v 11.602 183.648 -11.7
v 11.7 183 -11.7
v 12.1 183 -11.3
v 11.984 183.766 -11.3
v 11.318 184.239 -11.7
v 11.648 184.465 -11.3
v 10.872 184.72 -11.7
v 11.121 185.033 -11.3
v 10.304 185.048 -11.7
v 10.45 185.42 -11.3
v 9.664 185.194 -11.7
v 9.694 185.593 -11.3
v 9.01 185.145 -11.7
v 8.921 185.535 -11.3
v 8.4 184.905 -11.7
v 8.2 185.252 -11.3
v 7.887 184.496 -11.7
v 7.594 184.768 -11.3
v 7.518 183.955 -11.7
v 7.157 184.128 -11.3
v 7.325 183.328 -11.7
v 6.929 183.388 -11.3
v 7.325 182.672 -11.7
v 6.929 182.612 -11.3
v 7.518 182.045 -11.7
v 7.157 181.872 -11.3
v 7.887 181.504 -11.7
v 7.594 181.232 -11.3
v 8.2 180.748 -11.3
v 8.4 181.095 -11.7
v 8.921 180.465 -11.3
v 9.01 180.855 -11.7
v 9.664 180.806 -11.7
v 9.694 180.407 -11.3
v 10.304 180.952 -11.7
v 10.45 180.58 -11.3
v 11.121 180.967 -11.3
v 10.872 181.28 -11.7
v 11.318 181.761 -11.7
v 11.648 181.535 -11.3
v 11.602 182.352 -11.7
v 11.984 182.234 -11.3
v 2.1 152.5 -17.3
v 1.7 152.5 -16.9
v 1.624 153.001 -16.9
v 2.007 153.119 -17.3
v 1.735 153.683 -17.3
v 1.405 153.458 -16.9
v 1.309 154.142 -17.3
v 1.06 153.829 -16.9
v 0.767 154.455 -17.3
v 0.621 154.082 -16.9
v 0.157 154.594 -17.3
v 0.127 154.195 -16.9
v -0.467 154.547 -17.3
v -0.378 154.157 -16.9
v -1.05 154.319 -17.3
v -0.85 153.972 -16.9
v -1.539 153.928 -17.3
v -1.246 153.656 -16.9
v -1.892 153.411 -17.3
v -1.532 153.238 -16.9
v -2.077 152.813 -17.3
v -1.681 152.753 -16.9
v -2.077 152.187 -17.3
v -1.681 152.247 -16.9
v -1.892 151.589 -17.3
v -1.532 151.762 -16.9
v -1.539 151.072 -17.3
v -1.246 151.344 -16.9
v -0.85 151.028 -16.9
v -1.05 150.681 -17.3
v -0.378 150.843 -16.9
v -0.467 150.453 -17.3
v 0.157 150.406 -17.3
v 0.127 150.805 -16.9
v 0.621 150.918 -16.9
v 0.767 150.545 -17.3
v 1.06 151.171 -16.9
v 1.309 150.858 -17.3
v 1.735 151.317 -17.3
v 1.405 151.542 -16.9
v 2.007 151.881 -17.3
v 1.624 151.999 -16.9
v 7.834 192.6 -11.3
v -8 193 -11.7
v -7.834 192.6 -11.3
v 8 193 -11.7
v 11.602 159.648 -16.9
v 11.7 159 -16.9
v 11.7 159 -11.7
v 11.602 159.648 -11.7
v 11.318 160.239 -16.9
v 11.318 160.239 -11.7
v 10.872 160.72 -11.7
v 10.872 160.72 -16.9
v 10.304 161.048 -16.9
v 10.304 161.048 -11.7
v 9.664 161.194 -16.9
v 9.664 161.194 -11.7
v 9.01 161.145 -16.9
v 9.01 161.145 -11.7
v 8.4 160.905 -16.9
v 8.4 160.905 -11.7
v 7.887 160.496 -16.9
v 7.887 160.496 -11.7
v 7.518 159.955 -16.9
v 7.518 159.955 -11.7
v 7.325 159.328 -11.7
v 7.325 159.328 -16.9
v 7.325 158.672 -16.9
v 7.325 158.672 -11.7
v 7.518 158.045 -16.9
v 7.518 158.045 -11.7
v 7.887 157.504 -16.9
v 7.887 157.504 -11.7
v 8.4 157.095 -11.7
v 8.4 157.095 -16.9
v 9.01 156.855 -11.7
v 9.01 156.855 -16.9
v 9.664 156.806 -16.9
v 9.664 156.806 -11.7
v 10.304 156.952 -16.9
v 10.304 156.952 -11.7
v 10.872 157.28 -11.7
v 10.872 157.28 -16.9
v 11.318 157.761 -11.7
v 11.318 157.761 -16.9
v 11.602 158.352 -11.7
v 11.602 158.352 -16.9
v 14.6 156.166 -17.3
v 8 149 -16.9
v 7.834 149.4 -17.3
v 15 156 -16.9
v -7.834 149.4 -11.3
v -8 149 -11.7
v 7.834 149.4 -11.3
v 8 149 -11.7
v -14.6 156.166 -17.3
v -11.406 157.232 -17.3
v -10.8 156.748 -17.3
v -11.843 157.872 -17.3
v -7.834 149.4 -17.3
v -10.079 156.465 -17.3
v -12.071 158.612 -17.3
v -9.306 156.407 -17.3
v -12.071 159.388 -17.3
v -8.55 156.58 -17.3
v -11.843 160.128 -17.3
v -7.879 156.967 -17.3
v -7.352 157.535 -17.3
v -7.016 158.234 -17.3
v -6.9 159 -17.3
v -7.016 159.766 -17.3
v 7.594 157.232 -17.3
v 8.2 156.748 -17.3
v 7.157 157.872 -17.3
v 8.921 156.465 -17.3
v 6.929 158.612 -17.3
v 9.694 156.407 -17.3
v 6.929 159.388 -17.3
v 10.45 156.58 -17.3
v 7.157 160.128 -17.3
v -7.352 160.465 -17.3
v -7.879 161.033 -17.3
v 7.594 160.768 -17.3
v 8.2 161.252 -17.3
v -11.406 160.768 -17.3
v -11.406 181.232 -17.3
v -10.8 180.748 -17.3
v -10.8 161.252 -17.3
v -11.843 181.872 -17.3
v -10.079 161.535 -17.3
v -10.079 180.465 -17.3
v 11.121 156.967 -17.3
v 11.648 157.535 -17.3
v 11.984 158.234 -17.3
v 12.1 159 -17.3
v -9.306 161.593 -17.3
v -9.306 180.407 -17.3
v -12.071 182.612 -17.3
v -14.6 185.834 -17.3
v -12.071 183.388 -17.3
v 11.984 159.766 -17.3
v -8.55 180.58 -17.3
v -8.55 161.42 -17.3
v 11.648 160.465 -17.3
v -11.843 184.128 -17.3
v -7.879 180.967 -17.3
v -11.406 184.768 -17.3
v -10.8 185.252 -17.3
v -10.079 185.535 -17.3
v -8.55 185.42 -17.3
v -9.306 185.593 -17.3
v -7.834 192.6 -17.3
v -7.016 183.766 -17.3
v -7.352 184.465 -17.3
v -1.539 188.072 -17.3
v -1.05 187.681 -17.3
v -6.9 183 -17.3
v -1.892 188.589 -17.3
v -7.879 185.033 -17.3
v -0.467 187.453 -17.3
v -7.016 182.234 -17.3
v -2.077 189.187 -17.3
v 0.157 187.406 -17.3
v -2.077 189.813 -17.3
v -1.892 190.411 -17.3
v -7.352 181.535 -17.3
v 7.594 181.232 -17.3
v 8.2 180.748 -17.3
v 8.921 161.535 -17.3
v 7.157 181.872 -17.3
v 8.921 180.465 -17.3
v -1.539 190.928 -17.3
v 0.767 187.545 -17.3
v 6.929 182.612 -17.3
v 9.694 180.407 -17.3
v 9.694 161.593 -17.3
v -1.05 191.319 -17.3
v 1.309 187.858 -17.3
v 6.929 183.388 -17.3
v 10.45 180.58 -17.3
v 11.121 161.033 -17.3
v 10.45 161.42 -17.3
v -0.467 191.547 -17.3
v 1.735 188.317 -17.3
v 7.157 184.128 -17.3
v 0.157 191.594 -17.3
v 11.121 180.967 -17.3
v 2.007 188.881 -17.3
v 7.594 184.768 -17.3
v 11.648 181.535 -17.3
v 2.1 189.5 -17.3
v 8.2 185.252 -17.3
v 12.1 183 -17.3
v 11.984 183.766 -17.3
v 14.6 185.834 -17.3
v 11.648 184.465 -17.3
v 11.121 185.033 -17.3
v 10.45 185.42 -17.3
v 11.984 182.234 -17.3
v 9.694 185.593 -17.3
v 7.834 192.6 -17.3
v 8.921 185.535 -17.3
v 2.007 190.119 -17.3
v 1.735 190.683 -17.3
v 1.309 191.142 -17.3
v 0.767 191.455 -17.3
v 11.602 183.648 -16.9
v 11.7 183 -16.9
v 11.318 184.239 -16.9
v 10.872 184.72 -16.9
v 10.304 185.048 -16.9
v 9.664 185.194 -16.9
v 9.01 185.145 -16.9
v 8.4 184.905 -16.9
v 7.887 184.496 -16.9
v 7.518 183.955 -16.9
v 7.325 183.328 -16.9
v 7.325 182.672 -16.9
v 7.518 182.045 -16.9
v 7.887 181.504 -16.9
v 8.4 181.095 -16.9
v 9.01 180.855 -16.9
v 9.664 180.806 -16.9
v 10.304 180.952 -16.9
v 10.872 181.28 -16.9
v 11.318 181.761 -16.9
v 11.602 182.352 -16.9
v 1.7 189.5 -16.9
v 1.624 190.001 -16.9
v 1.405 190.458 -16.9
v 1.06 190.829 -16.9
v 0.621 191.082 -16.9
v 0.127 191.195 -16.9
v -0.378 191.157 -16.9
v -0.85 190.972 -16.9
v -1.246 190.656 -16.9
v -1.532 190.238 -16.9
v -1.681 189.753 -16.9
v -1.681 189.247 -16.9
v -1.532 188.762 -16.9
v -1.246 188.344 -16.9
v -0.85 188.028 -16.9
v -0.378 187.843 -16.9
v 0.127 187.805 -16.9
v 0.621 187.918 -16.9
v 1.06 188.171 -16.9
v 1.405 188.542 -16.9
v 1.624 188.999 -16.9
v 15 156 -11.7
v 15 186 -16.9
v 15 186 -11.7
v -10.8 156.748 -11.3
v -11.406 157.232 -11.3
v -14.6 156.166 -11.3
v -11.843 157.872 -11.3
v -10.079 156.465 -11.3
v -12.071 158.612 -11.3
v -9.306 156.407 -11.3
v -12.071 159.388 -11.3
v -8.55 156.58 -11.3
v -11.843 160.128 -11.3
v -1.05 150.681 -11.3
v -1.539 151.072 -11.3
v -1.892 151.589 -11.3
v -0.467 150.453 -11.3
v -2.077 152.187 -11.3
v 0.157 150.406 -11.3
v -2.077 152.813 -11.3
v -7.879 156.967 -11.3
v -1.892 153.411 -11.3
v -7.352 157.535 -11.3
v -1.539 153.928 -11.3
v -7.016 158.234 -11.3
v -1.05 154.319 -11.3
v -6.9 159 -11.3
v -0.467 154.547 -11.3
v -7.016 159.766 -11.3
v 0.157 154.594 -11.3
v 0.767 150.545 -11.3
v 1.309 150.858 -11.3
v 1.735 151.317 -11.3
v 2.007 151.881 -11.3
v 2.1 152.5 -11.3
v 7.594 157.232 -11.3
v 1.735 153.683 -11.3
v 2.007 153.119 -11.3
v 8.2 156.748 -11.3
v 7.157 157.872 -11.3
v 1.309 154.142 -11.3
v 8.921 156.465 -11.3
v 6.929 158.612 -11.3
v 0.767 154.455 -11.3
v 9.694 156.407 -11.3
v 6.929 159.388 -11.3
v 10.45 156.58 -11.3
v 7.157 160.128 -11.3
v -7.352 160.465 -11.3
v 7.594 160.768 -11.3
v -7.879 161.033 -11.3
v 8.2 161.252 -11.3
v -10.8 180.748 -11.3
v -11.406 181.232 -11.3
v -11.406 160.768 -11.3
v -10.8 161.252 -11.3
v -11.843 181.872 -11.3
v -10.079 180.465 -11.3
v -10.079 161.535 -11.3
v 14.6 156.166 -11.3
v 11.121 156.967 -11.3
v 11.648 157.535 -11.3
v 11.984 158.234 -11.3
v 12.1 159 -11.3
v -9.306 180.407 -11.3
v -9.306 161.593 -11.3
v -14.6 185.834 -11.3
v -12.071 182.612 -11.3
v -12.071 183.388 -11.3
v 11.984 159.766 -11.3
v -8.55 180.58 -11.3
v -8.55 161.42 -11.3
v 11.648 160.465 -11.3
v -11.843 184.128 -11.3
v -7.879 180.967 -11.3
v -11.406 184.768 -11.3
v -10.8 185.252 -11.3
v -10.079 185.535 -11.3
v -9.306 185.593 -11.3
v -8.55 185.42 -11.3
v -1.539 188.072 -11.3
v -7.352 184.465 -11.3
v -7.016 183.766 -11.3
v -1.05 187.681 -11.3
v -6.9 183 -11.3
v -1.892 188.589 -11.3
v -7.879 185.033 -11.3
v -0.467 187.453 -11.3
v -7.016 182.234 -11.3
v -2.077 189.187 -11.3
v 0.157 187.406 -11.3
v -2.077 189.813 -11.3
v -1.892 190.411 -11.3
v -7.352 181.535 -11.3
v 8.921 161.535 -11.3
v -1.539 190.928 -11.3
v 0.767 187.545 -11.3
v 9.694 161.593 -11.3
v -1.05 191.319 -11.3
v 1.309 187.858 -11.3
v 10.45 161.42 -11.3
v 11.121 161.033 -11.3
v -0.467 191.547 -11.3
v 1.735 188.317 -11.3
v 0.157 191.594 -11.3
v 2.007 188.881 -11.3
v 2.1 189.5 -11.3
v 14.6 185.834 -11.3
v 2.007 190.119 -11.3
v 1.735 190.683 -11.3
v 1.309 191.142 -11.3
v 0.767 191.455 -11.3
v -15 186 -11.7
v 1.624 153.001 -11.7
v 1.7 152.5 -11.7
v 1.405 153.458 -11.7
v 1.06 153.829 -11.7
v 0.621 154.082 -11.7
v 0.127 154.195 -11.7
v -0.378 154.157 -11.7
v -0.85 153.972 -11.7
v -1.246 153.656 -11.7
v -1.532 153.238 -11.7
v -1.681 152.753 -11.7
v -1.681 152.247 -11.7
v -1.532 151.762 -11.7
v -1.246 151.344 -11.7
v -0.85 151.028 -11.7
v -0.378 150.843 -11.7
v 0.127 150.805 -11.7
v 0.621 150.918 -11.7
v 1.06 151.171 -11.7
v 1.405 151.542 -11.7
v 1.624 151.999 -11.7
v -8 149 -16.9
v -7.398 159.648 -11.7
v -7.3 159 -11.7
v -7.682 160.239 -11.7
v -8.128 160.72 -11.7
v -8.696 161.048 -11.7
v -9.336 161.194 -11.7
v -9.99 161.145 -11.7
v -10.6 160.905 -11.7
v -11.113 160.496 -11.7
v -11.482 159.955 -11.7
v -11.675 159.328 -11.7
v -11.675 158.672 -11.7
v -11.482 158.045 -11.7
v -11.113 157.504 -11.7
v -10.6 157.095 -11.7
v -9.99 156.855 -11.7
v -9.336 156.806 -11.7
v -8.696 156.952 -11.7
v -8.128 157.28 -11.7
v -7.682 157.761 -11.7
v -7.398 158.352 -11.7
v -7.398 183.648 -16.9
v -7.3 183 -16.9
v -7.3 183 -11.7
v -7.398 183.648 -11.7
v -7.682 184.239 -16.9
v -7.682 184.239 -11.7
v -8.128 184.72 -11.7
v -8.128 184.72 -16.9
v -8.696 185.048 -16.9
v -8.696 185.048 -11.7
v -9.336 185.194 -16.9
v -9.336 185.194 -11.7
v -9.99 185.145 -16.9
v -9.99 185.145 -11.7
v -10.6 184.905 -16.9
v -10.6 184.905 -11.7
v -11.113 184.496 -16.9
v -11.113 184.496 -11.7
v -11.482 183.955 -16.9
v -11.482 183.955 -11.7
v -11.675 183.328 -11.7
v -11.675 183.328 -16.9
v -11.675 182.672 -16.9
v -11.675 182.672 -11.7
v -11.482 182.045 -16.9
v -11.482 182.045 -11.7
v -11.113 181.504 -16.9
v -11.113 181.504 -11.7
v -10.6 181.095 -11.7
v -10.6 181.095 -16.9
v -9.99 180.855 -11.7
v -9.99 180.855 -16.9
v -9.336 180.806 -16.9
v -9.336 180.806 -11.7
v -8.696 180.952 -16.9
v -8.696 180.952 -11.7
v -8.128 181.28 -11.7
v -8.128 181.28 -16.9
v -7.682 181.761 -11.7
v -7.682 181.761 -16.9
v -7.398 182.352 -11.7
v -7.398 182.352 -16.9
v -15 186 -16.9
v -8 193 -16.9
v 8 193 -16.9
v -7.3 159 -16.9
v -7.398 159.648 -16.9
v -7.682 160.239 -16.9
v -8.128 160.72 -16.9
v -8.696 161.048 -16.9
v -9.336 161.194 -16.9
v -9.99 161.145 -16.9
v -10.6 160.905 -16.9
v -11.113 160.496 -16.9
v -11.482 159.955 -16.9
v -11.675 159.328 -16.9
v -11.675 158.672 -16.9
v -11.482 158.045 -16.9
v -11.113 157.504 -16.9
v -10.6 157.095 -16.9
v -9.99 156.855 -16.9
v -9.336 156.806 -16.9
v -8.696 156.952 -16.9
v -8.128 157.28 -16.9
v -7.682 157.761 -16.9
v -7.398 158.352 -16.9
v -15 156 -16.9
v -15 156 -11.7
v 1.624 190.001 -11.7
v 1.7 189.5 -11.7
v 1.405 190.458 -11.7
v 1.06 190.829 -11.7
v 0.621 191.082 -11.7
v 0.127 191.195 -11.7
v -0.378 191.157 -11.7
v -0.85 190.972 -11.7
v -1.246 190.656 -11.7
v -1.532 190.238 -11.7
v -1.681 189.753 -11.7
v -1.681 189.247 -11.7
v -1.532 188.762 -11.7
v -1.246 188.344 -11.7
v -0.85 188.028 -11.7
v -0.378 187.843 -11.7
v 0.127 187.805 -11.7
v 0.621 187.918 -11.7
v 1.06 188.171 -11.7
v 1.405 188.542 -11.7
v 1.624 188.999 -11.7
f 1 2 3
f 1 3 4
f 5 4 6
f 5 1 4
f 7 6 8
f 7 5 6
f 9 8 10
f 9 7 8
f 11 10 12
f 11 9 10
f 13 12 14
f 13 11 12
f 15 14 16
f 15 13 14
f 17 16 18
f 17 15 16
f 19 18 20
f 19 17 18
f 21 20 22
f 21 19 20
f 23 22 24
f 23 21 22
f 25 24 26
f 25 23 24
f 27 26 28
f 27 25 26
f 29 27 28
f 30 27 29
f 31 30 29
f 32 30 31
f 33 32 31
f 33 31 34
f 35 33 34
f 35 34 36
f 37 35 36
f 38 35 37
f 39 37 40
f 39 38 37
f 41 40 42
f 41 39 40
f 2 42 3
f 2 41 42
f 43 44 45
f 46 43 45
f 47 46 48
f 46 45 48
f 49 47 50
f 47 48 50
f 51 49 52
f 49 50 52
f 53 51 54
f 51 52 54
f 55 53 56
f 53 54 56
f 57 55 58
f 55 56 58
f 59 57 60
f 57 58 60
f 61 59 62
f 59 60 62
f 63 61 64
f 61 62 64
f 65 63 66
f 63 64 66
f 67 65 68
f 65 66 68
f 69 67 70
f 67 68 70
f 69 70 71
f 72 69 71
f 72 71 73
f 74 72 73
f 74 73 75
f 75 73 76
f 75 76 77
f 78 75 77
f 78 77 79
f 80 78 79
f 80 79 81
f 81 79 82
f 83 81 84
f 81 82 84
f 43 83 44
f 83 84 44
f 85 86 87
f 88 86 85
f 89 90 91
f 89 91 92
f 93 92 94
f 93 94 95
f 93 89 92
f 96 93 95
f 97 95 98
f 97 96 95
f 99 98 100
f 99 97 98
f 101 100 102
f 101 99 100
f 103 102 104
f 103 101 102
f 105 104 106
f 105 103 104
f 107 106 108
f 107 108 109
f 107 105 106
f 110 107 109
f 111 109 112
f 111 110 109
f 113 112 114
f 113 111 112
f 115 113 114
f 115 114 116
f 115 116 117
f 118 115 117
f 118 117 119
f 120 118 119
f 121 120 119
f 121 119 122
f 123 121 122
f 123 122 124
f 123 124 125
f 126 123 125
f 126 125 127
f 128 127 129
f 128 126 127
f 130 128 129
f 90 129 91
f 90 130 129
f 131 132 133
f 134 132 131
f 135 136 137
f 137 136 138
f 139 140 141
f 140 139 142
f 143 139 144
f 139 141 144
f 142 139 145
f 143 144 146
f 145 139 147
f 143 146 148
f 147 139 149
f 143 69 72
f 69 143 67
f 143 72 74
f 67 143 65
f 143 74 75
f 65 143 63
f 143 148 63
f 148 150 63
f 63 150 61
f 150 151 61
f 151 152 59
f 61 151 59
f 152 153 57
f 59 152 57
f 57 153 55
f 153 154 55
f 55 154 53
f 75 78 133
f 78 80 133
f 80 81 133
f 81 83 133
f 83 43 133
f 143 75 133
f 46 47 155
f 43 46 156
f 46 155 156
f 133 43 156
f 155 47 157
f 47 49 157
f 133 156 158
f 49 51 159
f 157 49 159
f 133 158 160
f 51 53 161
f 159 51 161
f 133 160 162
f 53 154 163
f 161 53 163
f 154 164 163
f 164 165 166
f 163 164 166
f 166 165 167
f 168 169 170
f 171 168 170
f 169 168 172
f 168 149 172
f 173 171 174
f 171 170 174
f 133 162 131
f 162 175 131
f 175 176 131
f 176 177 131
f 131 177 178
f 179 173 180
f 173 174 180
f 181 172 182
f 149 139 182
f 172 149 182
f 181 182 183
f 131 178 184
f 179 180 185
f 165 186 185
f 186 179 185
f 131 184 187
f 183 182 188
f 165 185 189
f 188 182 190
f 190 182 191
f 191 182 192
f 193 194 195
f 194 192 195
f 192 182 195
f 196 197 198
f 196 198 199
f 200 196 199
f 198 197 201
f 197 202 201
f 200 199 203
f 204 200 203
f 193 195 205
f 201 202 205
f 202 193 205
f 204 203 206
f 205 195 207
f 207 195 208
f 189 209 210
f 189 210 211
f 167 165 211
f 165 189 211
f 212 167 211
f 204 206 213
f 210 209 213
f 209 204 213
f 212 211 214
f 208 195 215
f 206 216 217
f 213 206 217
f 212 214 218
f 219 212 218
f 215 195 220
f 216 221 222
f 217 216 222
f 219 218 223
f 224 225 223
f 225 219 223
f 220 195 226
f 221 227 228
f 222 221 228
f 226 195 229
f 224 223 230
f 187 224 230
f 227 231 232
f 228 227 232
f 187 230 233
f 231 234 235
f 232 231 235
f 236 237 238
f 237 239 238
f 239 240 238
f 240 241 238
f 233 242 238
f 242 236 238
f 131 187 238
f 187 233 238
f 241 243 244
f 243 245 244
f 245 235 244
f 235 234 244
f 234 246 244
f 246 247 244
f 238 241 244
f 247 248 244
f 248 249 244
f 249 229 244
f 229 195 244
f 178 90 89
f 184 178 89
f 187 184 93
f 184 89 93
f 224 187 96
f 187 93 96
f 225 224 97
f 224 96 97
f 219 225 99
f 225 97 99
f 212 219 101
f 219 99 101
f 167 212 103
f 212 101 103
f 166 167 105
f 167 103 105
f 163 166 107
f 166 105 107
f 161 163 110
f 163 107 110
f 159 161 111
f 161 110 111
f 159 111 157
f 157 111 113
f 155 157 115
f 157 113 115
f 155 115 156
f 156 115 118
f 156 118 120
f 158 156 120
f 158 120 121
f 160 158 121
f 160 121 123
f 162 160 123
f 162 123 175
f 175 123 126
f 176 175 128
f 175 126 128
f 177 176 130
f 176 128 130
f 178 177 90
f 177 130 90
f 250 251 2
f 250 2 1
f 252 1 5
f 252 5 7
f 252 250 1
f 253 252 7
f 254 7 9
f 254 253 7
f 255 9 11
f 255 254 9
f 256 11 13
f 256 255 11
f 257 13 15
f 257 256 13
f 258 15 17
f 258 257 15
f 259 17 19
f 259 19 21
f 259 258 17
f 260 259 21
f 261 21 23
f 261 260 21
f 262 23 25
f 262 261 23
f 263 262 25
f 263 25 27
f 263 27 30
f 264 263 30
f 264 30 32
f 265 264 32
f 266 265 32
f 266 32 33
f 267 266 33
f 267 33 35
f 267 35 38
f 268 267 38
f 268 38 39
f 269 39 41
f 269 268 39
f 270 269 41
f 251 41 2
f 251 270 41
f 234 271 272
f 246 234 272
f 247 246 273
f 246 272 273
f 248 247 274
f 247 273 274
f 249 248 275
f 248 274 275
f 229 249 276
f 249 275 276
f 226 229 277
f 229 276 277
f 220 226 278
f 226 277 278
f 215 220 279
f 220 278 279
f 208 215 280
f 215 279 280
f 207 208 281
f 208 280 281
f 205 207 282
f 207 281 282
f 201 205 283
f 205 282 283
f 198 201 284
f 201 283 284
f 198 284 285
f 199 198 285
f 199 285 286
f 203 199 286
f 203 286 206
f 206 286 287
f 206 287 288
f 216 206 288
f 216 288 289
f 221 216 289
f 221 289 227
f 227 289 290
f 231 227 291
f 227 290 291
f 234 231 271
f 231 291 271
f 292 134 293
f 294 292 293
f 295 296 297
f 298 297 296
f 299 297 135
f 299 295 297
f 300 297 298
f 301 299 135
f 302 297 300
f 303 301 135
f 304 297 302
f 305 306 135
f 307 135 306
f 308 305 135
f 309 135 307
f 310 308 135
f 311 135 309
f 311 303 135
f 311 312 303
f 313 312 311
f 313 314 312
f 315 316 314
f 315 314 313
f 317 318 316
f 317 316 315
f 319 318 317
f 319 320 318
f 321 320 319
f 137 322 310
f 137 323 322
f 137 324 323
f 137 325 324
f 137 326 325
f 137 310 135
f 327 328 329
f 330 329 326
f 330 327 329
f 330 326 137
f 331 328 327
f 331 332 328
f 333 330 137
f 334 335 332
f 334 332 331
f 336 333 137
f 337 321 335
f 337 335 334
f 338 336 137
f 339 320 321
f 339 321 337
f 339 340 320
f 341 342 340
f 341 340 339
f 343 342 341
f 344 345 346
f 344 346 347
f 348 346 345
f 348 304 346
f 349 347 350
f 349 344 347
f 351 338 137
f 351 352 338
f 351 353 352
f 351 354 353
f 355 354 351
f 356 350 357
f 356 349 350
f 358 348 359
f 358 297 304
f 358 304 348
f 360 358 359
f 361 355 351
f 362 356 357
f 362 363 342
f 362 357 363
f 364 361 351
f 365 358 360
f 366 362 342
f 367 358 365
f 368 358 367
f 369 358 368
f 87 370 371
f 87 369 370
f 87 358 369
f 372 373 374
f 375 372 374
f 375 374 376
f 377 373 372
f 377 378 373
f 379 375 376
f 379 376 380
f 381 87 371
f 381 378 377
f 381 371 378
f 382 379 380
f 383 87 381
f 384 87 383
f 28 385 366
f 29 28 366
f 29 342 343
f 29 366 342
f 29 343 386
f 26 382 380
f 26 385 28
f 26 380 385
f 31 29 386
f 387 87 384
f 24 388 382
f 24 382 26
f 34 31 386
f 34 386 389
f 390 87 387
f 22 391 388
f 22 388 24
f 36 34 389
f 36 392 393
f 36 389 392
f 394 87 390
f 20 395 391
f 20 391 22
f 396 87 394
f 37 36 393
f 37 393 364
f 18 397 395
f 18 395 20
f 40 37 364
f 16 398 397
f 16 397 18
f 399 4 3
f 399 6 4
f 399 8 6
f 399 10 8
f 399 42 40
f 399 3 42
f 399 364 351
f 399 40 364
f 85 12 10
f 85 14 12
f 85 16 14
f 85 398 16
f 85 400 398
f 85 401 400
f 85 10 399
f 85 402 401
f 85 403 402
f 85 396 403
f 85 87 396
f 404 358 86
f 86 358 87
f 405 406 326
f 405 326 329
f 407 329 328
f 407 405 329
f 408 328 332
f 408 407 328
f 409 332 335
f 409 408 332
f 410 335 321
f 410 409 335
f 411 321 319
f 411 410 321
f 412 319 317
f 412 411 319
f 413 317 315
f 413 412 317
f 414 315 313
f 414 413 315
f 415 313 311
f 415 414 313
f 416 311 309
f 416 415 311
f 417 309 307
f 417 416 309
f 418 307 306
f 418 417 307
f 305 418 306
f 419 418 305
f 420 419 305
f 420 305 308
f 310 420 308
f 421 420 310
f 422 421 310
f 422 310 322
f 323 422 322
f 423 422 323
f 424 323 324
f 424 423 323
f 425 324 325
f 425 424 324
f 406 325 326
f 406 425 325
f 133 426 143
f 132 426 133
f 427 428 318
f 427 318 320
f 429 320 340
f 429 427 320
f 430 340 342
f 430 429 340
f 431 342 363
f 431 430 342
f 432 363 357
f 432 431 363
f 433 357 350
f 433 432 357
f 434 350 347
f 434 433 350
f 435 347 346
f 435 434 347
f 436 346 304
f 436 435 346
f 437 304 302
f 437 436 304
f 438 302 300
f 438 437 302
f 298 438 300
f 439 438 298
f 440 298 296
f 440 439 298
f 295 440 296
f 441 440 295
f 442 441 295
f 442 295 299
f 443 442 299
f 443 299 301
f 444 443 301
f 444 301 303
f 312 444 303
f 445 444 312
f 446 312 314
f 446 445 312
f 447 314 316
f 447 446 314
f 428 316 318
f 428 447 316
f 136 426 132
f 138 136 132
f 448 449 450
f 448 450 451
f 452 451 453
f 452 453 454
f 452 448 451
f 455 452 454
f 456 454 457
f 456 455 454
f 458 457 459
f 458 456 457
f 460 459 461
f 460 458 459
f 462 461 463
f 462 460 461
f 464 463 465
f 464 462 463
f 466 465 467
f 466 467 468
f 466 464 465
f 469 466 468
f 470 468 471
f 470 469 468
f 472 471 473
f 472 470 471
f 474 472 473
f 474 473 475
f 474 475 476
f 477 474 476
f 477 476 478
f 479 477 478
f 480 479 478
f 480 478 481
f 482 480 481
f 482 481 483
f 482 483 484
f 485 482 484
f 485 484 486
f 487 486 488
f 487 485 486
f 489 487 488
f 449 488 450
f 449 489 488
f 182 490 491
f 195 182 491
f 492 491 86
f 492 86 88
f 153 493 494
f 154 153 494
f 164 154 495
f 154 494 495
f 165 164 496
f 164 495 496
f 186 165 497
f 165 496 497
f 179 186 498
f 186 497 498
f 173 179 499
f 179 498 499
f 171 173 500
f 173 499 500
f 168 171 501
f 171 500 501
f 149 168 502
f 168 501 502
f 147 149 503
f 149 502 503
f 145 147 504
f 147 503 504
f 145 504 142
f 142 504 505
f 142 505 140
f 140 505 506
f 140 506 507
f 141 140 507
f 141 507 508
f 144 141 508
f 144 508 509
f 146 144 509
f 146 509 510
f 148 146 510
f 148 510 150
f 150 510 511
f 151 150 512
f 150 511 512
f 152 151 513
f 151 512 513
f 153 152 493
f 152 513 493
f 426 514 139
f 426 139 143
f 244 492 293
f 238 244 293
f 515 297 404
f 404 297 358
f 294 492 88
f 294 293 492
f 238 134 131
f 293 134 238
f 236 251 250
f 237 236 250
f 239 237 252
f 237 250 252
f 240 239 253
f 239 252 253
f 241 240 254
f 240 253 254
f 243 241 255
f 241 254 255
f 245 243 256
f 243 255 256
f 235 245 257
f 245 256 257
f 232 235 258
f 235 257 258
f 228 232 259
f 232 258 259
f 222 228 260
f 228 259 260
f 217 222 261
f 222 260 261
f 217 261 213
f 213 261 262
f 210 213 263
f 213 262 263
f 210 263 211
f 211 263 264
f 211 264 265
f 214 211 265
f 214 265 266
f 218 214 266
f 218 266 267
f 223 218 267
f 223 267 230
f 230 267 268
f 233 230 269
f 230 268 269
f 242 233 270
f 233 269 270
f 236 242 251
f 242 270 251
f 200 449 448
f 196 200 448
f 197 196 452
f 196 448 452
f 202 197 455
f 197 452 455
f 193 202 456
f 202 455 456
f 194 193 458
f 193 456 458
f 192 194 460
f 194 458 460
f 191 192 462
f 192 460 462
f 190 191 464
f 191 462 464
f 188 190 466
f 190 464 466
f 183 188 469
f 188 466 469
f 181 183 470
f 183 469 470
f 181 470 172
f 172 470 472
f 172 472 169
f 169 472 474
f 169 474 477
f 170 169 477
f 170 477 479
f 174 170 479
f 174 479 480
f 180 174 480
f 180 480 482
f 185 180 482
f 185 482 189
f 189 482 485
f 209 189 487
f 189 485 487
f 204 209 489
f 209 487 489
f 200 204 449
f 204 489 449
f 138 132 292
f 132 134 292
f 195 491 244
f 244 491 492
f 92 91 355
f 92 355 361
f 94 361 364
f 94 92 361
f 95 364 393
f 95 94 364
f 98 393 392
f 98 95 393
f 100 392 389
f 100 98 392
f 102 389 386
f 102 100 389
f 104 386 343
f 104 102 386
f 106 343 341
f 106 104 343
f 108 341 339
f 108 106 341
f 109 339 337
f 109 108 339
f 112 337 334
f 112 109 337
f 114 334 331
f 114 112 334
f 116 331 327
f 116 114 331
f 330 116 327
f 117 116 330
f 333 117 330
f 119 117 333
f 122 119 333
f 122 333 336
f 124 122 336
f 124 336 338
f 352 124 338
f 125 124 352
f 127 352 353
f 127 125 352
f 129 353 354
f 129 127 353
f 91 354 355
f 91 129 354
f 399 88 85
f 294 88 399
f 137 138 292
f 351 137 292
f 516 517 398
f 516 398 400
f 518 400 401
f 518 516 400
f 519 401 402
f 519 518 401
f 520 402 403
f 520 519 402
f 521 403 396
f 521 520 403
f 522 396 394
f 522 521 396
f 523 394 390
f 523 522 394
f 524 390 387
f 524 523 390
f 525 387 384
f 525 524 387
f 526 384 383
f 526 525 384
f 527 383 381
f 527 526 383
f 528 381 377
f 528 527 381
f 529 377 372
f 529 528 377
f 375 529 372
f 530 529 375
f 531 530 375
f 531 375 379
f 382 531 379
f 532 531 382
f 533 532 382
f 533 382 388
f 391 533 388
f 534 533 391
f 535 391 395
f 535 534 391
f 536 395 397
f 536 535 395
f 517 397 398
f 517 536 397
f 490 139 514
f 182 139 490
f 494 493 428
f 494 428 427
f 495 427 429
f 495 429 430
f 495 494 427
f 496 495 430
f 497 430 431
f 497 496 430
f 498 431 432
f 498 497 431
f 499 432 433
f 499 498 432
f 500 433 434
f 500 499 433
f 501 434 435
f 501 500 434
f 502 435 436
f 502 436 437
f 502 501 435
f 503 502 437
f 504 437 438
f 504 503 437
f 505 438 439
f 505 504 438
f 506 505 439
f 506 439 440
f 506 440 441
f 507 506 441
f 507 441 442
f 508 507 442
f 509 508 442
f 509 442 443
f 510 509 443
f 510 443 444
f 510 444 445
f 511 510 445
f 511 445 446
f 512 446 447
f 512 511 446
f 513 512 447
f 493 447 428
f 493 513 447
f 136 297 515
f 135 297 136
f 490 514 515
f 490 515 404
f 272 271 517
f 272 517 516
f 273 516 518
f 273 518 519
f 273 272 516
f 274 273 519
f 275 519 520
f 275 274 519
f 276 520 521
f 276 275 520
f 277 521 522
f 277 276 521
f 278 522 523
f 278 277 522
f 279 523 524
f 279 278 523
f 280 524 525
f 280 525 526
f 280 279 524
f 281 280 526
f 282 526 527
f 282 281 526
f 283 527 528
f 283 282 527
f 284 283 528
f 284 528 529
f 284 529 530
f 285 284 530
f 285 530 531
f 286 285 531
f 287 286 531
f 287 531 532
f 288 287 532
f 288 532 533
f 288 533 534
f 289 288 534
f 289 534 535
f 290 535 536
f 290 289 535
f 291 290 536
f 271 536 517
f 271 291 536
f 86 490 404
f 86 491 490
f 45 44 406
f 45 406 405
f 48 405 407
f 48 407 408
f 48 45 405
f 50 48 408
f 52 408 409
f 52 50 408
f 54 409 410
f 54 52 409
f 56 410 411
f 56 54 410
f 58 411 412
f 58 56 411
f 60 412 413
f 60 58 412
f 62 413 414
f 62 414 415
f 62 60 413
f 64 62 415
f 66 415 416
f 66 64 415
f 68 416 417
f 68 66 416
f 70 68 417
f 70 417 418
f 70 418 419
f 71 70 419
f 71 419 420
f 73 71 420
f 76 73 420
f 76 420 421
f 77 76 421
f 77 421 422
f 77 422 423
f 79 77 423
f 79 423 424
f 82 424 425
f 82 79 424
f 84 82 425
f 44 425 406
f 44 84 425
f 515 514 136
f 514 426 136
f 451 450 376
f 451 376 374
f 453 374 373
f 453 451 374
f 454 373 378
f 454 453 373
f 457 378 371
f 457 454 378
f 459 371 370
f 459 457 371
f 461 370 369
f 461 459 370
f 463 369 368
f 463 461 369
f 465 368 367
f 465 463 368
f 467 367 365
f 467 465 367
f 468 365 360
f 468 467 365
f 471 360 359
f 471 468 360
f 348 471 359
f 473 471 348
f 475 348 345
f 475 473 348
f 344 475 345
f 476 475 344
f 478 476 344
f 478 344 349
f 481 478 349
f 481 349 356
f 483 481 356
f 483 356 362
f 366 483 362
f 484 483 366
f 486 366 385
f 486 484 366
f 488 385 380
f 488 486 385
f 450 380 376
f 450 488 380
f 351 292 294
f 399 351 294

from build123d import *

# Parameters (mm, degrees)
SKETCH030_W     = 30
SKETCH030_H     = 44
SKETCH030_R     = 2.2
SKETCH030_R_2   = 1.7
PAD016_DEPTH    = 6
CHAMFER007_SIZE = 7
CHAMFER008_SIZE = 0.4


with BuildPart() as part:
    # Sketch030 → Pad016 (new body)
    with BuildSketch(Plane.XY):
        Rectangle(SKETCH030_W, SKETCH030_H)
        with Locations((9.5, 12)):
            Circle(SKETCH030_R, mode=Mode.SUBTRACT)
        with Locations((-9.5, 12)):
            Circle(SKETCH030_R, mode=Mode.SUBTRACT)
        with Locations((-9.5, -12)):
            Circle(SKETCH030_R, mode=Mode.SUBTRACT)
        with Locations((9.5, -12)):
            Circle(SKETCH030_R, mode=Mode.SUBTRACT)
        with Locations((0, 18.5)):
            Circle(SKETCH030_R_2, mode=Mode.SUBTRACT)
        with Locations((0, -18.5)):
            Circle(SKETCH030_R_2, mode=Mode.SUBTRACT)
    extrude(amount=PAD016_DEPTH)

    # Chamfer007
    chamfer007_edges = [part.edges().sort_by_distance(p)[0] for p in [
        (15, 22, 3),
        (-15, 22, 3),
        (-15, -22, 3),
        (15, -22, 3),
    ]]
    chamfer(chamfer007_edges, length=CHAMFER007_SIZE)

    # Chamfer008
    chamfer008_edges = [part.edges().sort_by_distance(p)[0] for p in [
        (-15, 0, 6),
        (-11.5, -18.5, 6),
        (-11.5, 18.5, 6),
        (0, -22, 6),
        (0, 22, 6),
        (11.5, -18.5, 6),
        (11.5, 18.5, 6),
        (15, 0, 6),
        (7.3, 12, 6),
        (-11.7, 12, 6),
        (-11.7, -12, 6),
        (7.3, -12, 6),
        (-1.7, 18.5, 6),
        (-1.7, -18.5, 6),
        (-15, 0, 0),
        (-11.5, -18.5, 0),
        (-11.5, 18.5, 0),
        (0, -22, 0),
        (0, 22, 0),
        (11.5, -18.5, 0),
        (11.5, 18.5, 0),
        (15, 0, 0),
        (7.3, 12, 0),
        (-11.7, 12, 0),
        (-11.7, -12, 0),
        (7.3, -12, 0),
        (-1.7, 18.5, 0),
        (-1.7, -18.5, 0),
    ]]
    chamfer(chamfer008_edges, length=CHAMFER008_SIZE)


with BuildPart() as part_1:
    # Body011 placement: moved
    add(part.part.moved(Location((0, 171, -17.3))))


solid = part_1.part
